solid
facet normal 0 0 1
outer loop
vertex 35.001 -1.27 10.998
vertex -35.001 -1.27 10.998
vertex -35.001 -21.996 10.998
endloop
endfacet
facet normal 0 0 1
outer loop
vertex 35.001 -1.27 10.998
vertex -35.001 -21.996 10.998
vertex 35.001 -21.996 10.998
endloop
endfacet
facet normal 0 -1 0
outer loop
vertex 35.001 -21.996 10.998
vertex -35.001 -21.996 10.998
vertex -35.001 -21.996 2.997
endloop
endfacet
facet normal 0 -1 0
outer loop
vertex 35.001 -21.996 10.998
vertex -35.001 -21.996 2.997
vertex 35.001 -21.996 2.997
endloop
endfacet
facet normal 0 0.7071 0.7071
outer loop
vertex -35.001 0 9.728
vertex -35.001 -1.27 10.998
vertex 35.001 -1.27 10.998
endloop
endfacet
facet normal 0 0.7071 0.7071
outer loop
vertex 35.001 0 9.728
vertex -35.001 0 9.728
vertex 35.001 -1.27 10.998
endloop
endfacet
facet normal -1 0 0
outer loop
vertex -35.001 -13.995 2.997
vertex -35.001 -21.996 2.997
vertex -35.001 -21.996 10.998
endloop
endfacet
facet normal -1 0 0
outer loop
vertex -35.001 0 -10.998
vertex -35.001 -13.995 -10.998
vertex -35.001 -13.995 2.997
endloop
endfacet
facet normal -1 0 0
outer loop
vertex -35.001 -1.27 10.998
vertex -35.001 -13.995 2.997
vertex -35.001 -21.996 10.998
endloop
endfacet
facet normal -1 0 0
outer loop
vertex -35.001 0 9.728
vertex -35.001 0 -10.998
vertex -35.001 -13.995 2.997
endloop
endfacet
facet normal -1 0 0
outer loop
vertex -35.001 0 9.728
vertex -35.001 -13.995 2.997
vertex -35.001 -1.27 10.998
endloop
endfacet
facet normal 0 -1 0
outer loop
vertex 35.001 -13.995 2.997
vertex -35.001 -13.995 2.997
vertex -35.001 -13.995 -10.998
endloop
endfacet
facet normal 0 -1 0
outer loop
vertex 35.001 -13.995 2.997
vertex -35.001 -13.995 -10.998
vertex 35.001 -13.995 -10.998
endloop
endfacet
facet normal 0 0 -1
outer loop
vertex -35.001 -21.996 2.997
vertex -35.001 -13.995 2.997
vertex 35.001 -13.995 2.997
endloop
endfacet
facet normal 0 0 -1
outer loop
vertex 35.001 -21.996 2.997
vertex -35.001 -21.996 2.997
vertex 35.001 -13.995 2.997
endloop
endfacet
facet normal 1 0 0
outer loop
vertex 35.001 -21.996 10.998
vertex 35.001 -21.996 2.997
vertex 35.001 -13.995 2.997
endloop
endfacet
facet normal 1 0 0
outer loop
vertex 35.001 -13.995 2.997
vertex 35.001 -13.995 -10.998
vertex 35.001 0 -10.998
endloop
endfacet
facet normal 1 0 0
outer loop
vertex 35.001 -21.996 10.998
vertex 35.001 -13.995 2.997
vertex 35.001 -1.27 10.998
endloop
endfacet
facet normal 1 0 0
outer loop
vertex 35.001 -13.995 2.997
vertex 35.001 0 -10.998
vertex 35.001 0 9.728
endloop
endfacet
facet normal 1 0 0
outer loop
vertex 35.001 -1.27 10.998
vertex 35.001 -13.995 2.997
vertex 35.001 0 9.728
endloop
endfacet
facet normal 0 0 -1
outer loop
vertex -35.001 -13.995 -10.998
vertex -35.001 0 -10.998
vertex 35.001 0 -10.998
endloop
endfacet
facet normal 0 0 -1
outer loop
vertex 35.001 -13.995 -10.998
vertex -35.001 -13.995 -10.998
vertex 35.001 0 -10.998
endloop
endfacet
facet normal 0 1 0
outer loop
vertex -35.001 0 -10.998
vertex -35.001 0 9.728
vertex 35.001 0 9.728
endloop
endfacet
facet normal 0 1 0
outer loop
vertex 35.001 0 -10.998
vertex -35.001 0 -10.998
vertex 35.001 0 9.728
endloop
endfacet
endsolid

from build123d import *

# Parameters (mm, degrees)
F0_W     = 70.0024
F0_H     = 8.001
F1_DEPTH = 21.9964
F0_H_2   = 13.9954
F2_DEPTH = 13.9954
F3_SIZE  = 1.27


with BuildPart() as f1:
    # F0 (on Front) → F1 (new body)
    with BuildSketch(Plane.XZ):
        with Locations((0, 6.9977)):
            Rectangle(F0_W, F0_H)
    extrude(amount=F1_DEPTH)

    # F0 (on Front) → F2 (join)
    with BuildSketch(Plane.XZ):
        with Locations((0, -4.0005)):
            Rectangle(F0_W, F0_H_2)
    extrude(amount=F2_DEPTH)

    # F3
    f3_edges = [f1.edges().sort_by_distance(p)[0] for p in [
        (0, 0, 10.9982),
    ]]
    chamfer(f3_edges, length=F3_SIZE)


solid = f1.part
